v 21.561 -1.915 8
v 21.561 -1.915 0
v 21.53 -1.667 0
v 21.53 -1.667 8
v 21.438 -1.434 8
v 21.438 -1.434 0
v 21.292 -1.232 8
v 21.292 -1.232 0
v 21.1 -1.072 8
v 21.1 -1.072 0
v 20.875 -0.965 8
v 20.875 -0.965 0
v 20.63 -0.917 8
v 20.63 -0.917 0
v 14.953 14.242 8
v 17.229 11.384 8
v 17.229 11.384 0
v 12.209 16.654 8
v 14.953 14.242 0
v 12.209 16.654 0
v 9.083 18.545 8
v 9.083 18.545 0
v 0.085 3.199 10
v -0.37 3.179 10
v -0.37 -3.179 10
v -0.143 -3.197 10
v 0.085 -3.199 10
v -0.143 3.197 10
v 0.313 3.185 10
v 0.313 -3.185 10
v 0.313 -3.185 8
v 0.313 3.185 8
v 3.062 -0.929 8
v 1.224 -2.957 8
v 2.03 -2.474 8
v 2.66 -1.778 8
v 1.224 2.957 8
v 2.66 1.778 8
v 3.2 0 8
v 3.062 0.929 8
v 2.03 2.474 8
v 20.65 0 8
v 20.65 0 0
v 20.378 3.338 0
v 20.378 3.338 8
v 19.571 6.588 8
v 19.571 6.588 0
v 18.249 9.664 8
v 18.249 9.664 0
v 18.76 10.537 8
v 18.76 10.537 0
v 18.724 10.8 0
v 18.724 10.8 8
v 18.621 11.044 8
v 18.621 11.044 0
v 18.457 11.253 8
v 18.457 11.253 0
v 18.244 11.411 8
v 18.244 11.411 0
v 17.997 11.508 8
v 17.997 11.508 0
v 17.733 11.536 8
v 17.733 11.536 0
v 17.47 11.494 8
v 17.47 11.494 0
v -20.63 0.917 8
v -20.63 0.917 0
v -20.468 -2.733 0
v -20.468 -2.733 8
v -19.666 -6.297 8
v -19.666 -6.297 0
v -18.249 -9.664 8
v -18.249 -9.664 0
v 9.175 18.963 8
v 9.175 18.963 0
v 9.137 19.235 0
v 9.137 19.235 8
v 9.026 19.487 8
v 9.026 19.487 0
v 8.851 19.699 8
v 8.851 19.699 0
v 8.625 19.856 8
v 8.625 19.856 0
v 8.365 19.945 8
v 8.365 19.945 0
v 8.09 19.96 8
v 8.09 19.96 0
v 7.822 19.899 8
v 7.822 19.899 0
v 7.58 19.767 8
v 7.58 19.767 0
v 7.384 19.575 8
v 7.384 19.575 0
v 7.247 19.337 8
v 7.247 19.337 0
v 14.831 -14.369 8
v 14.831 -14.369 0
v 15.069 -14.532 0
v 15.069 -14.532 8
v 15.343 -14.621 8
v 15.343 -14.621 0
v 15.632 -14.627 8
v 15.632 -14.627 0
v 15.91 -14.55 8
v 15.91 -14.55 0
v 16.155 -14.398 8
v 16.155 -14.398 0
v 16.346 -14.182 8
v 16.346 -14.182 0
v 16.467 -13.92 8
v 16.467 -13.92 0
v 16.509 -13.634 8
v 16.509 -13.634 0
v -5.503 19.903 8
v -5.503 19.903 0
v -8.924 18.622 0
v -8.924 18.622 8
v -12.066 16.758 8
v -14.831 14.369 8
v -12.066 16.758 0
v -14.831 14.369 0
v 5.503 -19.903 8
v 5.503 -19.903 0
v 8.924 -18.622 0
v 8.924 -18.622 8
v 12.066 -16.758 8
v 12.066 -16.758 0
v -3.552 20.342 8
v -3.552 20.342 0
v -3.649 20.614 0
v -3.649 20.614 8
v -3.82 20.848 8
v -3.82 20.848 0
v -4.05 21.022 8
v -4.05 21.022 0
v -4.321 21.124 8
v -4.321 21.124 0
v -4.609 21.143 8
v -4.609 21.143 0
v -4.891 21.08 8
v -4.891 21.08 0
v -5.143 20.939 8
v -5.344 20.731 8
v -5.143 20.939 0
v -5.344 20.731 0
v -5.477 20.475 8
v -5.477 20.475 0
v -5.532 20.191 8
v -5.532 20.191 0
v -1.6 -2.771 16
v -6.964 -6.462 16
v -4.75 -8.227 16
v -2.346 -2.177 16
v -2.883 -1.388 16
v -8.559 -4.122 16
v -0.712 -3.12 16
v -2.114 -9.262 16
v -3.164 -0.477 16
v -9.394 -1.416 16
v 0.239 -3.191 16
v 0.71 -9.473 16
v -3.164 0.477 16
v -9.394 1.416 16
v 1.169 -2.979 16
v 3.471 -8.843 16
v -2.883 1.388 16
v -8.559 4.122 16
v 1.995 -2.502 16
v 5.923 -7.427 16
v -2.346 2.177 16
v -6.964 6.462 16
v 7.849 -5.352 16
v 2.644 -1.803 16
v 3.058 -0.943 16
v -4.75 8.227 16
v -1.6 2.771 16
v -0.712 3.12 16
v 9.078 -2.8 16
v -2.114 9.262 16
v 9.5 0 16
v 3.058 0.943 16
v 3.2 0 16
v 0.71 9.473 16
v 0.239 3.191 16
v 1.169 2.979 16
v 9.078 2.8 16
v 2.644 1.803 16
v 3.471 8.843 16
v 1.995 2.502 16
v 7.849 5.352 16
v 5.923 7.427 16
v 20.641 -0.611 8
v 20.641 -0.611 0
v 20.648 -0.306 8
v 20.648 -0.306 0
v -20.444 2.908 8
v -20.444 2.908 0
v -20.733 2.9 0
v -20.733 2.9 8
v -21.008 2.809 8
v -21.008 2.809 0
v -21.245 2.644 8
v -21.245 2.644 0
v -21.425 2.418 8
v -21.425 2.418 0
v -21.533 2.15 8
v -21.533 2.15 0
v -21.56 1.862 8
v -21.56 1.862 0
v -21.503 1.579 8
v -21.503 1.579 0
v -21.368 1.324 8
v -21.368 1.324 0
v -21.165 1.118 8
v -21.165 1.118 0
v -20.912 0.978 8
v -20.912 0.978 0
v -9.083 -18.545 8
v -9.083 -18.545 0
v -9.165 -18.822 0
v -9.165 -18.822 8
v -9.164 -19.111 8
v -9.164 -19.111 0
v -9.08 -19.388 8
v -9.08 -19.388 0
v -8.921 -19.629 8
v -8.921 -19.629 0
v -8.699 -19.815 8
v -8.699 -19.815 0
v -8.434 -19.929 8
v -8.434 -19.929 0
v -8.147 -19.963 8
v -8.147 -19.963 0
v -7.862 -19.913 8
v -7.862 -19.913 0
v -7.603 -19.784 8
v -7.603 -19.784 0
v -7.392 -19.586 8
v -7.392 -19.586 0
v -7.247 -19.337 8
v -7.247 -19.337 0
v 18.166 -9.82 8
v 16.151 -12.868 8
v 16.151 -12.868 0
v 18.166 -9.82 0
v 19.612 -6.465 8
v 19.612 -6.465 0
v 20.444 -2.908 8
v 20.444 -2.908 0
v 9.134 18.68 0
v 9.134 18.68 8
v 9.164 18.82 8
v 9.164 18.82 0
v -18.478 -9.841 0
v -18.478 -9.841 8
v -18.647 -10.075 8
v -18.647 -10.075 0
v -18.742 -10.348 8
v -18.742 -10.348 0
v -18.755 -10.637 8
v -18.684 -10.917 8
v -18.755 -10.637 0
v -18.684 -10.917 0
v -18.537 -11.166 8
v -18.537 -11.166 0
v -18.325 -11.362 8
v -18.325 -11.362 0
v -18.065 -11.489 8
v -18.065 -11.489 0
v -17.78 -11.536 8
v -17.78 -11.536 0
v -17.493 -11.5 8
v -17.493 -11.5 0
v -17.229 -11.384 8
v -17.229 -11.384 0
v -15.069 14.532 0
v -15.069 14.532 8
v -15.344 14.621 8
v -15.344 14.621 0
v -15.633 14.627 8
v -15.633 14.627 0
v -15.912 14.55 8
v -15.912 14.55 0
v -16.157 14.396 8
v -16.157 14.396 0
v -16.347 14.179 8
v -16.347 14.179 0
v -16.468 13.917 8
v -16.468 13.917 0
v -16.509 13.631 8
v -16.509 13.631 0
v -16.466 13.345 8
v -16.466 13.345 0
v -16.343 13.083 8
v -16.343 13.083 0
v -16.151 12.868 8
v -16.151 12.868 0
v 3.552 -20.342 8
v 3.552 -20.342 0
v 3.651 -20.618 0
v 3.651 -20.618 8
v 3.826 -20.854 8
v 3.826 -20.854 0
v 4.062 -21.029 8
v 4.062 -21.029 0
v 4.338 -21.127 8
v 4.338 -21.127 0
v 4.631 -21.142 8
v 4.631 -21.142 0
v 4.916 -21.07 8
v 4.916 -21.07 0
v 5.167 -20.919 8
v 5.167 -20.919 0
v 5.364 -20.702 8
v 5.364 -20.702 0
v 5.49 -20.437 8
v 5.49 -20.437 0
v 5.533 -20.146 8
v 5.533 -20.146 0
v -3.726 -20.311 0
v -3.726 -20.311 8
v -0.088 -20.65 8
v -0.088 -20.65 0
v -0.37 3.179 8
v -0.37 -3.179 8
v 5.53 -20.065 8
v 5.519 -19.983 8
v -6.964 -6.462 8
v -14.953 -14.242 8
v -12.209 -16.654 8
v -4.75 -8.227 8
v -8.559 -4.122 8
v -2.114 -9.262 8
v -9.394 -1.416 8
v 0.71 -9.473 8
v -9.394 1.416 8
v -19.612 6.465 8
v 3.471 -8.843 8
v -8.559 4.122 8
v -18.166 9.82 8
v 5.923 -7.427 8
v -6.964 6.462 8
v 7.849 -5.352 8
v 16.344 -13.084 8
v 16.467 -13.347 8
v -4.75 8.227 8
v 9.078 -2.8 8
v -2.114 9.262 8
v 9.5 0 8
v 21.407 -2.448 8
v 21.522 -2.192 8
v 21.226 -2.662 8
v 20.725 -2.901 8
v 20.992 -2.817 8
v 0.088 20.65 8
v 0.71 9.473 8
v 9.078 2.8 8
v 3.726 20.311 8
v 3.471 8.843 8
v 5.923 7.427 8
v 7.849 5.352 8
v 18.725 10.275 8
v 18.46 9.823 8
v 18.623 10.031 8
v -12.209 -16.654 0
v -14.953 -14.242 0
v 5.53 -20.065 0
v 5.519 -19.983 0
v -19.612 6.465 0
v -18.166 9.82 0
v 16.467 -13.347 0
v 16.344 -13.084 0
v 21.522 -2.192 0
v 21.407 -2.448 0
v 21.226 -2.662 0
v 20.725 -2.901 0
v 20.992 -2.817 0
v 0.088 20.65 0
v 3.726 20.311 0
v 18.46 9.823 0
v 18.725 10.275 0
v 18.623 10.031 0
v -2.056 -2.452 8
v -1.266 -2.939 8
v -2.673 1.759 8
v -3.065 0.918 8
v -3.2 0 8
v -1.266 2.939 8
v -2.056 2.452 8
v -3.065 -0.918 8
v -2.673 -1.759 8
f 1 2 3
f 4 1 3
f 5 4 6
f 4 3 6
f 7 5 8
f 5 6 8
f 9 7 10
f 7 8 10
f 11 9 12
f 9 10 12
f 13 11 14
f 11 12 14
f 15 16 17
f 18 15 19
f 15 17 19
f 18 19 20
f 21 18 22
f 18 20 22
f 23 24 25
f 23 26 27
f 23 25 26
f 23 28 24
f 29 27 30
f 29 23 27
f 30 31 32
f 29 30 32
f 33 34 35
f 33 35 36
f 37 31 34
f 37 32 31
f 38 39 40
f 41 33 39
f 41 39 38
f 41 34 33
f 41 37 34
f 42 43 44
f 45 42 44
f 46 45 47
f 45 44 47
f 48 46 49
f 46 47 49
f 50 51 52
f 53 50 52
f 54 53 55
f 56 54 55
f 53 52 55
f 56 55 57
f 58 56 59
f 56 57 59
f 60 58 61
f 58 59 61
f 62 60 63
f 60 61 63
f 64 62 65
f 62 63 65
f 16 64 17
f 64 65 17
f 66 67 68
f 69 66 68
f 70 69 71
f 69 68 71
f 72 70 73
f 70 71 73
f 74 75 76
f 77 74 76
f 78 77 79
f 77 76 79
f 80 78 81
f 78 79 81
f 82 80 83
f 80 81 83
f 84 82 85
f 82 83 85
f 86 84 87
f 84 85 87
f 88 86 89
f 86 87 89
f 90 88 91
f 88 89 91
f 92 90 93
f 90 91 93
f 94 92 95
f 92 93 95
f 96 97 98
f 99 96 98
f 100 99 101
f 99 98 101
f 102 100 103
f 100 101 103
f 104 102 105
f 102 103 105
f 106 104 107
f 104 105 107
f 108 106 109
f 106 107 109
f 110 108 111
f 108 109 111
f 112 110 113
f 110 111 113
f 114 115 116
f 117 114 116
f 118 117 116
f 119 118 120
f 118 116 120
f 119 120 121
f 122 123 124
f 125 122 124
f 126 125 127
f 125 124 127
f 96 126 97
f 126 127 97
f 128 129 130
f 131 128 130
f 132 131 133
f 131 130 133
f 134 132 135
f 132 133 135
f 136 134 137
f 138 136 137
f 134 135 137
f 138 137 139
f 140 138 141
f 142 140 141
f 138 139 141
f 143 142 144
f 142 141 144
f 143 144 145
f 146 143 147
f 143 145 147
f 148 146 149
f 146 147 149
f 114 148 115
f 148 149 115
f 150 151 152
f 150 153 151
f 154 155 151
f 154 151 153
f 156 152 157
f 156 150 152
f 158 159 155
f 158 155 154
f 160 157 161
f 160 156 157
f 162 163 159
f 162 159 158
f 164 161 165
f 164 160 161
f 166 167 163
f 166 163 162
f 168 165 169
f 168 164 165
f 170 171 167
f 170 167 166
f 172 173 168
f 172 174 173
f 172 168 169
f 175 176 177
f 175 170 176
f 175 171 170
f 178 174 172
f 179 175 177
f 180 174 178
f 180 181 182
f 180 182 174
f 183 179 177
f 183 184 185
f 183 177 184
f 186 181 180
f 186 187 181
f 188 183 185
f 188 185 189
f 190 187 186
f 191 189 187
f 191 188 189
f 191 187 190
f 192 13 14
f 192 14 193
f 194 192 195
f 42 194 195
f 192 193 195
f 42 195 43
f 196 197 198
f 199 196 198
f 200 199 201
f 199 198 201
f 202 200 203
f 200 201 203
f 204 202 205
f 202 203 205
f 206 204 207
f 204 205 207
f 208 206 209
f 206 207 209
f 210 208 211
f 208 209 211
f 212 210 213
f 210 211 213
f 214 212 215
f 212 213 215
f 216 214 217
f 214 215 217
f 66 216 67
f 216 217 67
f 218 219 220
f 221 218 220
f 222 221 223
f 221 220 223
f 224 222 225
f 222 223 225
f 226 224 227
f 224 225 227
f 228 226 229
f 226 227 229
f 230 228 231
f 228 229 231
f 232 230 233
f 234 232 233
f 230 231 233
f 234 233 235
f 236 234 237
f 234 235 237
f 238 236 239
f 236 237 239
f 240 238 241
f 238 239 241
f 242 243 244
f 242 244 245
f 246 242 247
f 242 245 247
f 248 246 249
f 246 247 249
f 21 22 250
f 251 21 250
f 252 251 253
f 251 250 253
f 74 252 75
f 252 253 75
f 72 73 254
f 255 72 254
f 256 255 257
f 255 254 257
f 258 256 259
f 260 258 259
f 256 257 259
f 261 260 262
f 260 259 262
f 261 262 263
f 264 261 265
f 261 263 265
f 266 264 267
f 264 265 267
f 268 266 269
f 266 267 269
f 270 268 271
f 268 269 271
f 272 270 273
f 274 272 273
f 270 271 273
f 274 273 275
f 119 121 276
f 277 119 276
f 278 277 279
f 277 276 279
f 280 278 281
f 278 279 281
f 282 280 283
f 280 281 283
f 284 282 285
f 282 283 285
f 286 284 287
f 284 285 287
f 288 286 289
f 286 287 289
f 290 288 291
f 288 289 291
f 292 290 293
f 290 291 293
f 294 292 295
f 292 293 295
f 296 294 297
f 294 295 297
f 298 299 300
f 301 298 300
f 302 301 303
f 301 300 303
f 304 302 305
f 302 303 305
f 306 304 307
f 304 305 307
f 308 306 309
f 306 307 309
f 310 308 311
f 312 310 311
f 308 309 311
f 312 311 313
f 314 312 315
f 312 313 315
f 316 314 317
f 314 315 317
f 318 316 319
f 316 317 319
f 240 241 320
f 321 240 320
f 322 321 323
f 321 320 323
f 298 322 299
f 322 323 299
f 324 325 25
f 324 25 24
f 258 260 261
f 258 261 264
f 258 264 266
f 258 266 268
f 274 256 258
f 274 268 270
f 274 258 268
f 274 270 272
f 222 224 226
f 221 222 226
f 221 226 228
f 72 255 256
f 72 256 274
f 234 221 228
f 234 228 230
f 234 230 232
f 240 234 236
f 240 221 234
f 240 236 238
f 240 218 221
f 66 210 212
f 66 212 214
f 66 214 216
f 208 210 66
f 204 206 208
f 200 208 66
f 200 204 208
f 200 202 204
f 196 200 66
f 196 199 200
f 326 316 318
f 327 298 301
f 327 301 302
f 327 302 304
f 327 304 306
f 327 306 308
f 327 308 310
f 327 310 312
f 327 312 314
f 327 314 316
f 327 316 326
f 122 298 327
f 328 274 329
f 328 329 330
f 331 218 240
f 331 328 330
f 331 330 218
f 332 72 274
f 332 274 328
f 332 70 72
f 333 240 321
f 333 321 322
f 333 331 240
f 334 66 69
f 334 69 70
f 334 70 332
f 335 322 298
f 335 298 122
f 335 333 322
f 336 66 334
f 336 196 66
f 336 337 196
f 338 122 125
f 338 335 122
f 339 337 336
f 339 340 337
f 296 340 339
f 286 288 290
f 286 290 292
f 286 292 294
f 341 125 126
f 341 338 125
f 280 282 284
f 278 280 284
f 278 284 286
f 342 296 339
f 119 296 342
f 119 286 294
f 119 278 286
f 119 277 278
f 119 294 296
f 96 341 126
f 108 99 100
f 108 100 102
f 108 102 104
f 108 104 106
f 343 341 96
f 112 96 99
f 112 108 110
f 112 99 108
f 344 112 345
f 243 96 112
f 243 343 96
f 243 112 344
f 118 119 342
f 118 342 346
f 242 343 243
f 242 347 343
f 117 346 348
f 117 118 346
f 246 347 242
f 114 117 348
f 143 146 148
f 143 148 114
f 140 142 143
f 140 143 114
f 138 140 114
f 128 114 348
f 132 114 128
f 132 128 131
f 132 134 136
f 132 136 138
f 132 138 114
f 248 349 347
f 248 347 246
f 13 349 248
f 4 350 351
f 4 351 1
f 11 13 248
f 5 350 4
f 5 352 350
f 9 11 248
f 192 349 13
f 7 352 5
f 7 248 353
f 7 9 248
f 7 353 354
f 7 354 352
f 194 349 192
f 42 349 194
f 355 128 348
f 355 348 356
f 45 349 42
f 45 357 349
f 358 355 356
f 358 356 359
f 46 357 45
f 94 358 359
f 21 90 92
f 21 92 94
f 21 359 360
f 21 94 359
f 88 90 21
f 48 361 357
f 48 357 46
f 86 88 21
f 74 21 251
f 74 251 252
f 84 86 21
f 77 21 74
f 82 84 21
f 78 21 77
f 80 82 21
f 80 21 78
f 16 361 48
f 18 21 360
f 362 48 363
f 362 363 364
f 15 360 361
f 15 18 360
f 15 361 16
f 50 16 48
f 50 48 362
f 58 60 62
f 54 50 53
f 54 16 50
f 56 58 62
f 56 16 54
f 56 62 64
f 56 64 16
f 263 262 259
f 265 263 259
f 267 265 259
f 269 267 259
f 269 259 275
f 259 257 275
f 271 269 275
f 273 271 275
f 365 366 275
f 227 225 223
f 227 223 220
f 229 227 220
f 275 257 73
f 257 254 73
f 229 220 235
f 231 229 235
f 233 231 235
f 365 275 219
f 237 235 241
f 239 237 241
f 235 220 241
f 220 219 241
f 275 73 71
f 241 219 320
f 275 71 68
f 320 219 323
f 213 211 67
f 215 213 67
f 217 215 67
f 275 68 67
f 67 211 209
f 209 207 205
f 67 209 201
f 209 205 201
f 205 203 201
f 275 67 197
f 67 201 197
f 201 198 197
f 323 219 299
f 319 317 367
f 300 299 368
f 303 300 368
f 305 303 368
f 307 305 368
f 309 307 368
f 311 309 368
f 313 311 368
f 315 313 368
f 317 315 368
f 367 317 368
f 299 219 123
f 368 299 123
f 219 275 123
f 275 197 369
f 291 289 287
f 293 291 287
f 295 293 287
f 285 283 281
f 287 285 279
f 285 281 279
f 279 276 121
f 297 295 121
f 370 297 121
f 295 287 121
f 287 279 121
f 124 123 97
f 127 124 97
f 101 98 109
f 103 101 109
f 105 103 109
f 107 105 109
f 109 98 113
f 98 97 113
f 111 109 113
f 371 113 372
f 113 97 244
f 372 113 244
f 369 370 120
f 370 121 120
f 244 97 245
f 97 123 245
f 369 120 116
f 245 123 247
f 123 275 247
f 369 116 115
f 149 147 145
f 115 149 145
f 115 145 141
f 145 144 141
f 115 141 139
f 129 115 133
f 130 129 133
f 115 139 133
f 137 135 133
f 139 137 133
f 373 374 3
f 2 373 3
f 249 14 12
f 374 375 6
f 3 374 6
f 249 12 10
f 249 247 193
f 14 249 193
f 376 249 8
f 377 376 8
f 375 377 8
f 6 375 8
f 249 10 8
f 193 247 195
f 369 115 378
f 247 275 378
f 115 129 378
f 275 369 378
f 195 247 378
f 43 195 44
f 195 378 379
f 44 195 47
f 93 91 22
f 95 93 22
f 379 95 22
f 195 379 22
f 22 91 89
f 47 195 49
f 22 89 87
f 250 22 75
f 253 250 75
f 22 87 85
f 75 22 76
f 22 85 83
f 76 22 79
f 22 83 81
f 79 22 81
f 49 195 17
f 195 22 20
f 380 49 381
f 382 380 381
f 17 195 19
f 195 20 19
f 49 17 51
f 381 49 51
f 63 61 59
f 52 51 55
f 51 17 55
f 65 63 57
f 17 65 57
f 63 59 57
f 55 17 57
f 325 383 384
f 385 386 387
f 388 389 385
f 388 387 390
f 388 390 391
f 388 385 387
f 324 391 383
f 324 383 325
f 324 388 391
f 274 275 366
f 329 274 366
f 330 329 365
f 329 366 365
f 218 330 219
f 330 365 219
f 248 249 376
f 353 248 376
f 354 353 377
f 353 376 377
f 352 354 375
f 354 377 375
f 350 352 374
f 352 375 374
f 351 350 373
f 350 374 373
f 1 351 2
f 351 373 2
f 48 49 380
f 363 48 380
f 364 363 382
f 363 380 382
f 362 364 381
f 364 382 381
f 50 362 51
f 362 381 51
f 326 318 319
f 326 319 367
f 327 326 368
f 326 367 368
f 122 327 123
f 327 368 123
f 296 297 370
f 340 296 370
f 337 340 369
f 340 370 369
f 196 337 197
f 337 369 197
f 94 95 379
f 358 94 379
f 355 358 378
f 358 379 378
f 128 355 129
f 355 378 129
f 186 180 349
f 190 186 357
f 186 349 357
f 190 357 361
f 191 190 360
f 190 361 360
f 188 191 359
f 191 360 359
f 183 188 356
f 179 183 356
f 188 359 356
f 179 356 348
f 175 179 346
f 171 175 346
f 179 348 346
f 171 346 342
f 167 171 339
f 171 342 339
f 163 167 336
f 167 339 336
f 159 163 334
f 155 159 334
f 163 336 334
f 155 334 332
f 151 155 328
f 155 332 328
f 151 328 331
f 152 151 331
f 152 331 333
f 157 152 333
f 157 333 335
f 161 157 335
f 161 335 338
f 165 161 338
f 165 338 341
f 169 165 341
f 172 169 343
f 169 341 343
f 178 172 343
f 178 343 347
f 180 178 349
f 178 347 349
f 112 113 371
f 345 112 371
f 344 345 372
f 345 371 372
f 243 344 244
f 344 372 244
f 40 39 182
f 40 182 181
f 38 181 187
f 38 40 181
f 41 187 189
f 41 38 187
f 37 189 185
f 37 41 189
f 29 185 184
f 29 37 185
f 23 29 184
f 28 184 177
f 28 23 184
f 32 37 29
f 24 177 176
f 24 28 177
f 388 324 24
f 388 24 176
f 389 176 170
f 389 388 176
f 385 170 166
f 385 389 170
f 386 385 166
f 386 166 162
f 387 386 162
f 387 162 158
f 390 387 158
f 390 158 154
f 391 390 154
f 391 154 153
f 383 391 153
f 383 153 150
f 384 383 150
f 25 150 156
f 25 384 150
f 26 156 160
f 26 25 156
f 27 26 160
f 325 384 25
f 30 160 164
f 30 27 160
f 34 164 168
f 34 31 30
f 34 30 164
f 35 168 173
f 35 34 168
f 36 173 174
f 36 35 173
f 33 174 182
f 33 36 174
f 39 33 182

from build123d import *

# Parameters (mm, degrees)
F1_DEPTH = 8
F2_R     = 9.5
F2_R_2   = 3.2
F3_DEPTH = 8
F4_W     = 0.682370679
F4_H     = 6.463566795
F5_DEPTH = 2


with BuildPart() as f1:
    # F0 (on Top) → F1 (new body)
    with BuildSketch(Plane.XY):
        with BuildLine():
            ThreePointArc((20.6296333293, -0.9169125905), (20.6449077044, -0.4585693786), (20.65, 0))
            ThreePointArc((20.65, 0), (20.0407277838, 4.9791294317), (18.2488639325, 9.6644433453))
            ThreePointArc((18.2488639325, 9.6644433453), (16.899563072, 10.0263287386), (17.228671645, 11.3839963699))
            ThreePointArc((17.228671645, 11.3839963699), (13.6343948602, 15.5088934743), (9.0830237721, 18.5451120017))
            ThreePointArc((9.0830237721, 18.5451120017), (7.7787055485, 18.0447842877), (7.2469429653, 19.3366056395))
            ThreePointArc((7.2469429653, 19.3366056395), (1.9145582783, 20.5610546081), (-3.5522227527, 20.34217819))
            ThreePointArc((-3.5522227527, 20.34217819), (-3.537714089, 20.2447444729), (-3.5328621738, 20.1463560108))
            ThreePointArc((-3.5328621738, 20.1463560108), (-4.4104069619, 19.1538819703), (-5.5028716159, 19.9032887729))
            ThreePointArc((-5.5028716159, 19.9032887729), (-10.5365744934, 17.7595917167), (-14.83064092, 14.3692237056))
            ThreePointArc((-14.83064092, 14.3692237056), (-14.5928551239, 14.0354855032), (-14.5088934877, 13.634394845))
            ThreePointArc((-14.5088934877, 13.634394845), (-15.0857403153, 12.7283366831), (-16.1507762731, 12.8675920738))
            ThreePointArc((-16.1507762731, 12.8675920738), (-18.9630939126, 8.1745684449), (-20.4442583125, 2.9077142313))
            ThreePointArc((-20.4442583125, 2.9077142313), (-19.813794176, 2.5790896437), (-19.5610546025, 1.9145583389))
            ThreePointArc((-19.5610546025, 1.9145583389), (-19.8786246519, 1.1836073402), (-20.6296333275, 0.916912631))
            ThreePointArc((-20.6296333275, 0.916912631), (-20.1463560242, -4.5328621144), (-18.2488639515, -9.6644433094))
            ThreePointArc((-18.2488639515, -9.6644433094), (-17.2542563165, -9.6736514422), (-16.7595917478, -10.536574441))
            ThreePointArc((-16.7595917478, -10.536574441), (-16.8846860156, -11.020867699), (-17.2286716673, -11.383996336))
            ThreePointArc((-17.2286716673, -11.383996336), (-13.6343948907, -15.5088934475), (-9.0830238086, -18.5451119838))
            ThreePointArc((-9.0830238086, -18.5451119838), (-7.9606237803, -17.9862481273), (-7.1745684636, -18.9630939046))
            ThreePointArc((-7.1745684636, -18.9630939046), (-7.1928288188, -19.1533234235), (-7.2469430033, -19.3366056253))
            ThreePointArc((-7.2469430033, -19.3366056253), (-1.9145583187, -20.5610546044), (3.5522227127, -20.342178197))
            ThreePointArc((3.5522227127, -20.342178197), (4.313353072, -19.1707455587), (5.5028715768, -19.9032887837))
            ThreePointArc((5.5028715768, -19.9032887837), (10.5365744585, -17.7595917375), (14.8306408918, -14.3692237348))
            ThreePointArc((14.8306408918, -14.3692237348), (14.7578574579, -12.9741336224), (16.1507762478, -12.8675921056))
            ThreePointArc((16.1507762478, -12.8675921056), (18.9630939126, -8.1745684449), (20.4442583182, -2.9077141911))
            ThreePointArc((20.4442583182, -2.9077141911), (19.5653618893, -1.8218436109), (20.6296333293, -0.9169125905))
        make_face()
        with BuildLine():
            ThreePointArc((17.228671645, 11.3839963699), (16.899563072, 10.0263287386), (18.2488639325, 9.6644433453))
            ThreePointArc((18.2488639325, 9.6644433453), (17.7595917271, 10.5365744759), (17.228671645, 11.3839963699))
        make_face()
        with BuildLine():
            ThreePointArc((17.228671645, 11.3839963699), (17.7595917271, 10.5365744759), (18.2488639325, 9.6644433453))
            ThreePointArc((18.2488639325, 9.6644433453), (18.6225147264, 10.0312390454), (18.7595917271, 10.5365744759))
            ThreePointArc((18.7595917271, 10.5365744759), (18.2438849843, 11.4114802086), (17.228671645, 11.3839963699))
        make_face()
        with BuildLine():
            ThreePointArc((21.5610546063, -1.9145582985), (21.2920056043, -1.2321283472), (20.6296333293, -0.9169125905))
            ThreePointArc((20.6296333293, -0.9169125905), (20.5610546063, -1.9145582985), (20.4442583182, -2.9077141911))
            ThreePointArc((20.4442583182, -2.9077141911), (21.2255859118, -2.6618187243), (21.5610546063, -1.9145582985))
        make_face()
        with BuildLine():
            ThreePointArc((20.4442583182, -2.9077141911), (20.5610546063, -1.9145582985), (20.6296333293, -0.9169125905))
            ThreePointArc((20.6296333293, -0.9169125905), (19.5653618893, -1.8218436109), (20.4442583182, -2.9077141911))
        make_face()
        with BuildLine():
            ThreePointArc((7.2469429653, 19.3366056395), (7.7787055485, 18.0447842877), (9.0830237721, 18.5451120017))
            ThreePointArc((9.0830237721, 18.5451120017), (8.1745684263, 18.9630939207), (7.2469429653, 19.3366056395))
        make_face()
        with BuildLine():
            ThreePointArc((7.2469429653, 19.3366056395), (8.1745684263, 18.9630939207), (9.0830237721, 18.5451120017))
            ThreePointArc((9.0830237721, 18.5451120017), (9.1514142038, 18.7491492384), (9.1745684263, 18.9630939207))
            ThreePointArc((9.1745684263, 18.9630939207), (8.3647979443, 19.9448335656), (7.2469429653, 19.3366056395))
        make_face()
        with BuildLine():
            ThreePointArc((16.5088934609, -13.6343948754), (16.4149516232, -13.2112417039), (16.1507762478, -12.8675921056))
            ThreePointArc((16.1507762478, -12.8675921056), (15.5088934609, -13.6343948754), (14.8306408918, -14.3692237348))
            ThreePointArc((14.8306408918, -14.3692237348), (15.9099841183, -14.5504332396), (16.5088934609, -13.6343948754))
        make_face()
        with BuildLine():
            ThreePointArc((14.8306408918, -14.3692237348), (15.5088934609, -13.6343948754), (16.1507762478, -12.8675921056))
            ThreePointArc((16.1507762478, -12.8675921056), (14.7578574579, -12.9741336224), (14.8306408918, -14.3692237348))
        make_face()
        with BuildLine():
            ThreePointArc((-3.5328621738, 20.1463560108), (-3.537714089, 20.2447444729), (-3.5522227527, 20.34217819))
            ThreePointArc((-3.5522227527, 20.34217819), (-4.5328621738, 20.1463560108), (-5.5028716159, 19.9032887729))
            ThreePointArc((-5.5028716159, 19.9032887729), (-4.4104069619, 19.1538819703), (-3.5328621738, 20.1463560108))
        make_face()
        with BuildLine():
            ThreePointArc((-5.5028716159, 19.9032887729), (-4.5328621738, 20.1463560108), (-3.5522227527, 20.34217819))
            ThreePointArc((-3.5522227527, 20.34217819), (-4.7523712379, 21.1219664714), (-5.5028716159, 19.9032887729))
        make_face()
        with BuildLine():
            ThreePointArc((5.5328621342, -20.1463560197), (5.5253361748, -20.0239008088), (5.5028715768, -19.9032887837))
            ThreePointArc((5.5028715768, -19.9032887837), (4.5328621342, -20.1463560197), (3.5522227127, -20.342178197))
            ThreePointArc((3.5522227127, -20.342178197), (4.6312505953, -21.1415041045), (5.5328621342, -20.1463560197))
        make_face()
        with BuildLine():
            ThreePointArc((3.5522227127, -20.342178197), (4.5328621342, -20.1463560197), (5.5028715768, -19.9032887837))
            ThreePointArc((5.5028715768, -19.9032887837), (4.313353072, -19.1707455587), (3.5522227127, -20.342178197))
        make_face()
        with BuildLine():
            ThreePointArc((-14.5088934877, 13.634394845), (-14.5928551239, 14.0354855032), (-14.83064092, 14.3692237056))
            ThreePointArc((-14.83064092, 14.3692237056), (-15.5088934877, 13.634394845), (-16.1507762731, 12.8675920738))
            ThreePointArc((-16.1507762731, 12.8675920738), (-15.0857403153, 12.7283366831), (-14.5088934877, 13.634394845))
        make_face()
        with BuildLine():
            ThreePointArc((-16.1507762731, 12.8675920738), (-15.5088934877, 13.634394845), (-14.83064092, 14.3692237056))
            ThreePointArc((-14.83064092, 14.3692237056), (-16.2599294919, 14.2946560965), (-16.1507762731, 12.8675920738))
        make_face()
        with BuildLine():
            ThreePointArc((-9.0830238086, -18.5451119838), (-8.5704313432, -19.8814035368), (-7.2469430033, -19.3366056253))
            ThreePointArc((-7.2469430033, -19.3366056253), (-8.1745684636, -18.9630939046), (-9.0830238086, -18.5451119838))
        make_face()
        with BuildLine():
            ThreePointArc((-9.0830238086, -18.5451119838), (-8.1745684636, -18.9630939046), (-7.2469430033, -19.3366056253))
            ThreePointArc((-7.2469430033, -19.3366056253), (-7.1928288188, -19.1533234235), (-7.1745684636, -18.9630939046))
            ThreePointArc((-7.1745684636, -18.9630939046), (-7.9606237803, -17.9862481273), (-9.0830238086, -18.5451119838))
        make_face()
        with BuildLine():
            ThreePointArc((-19.5610546025, 1.9145583389), (-19.813794176, 2.5790896437), (-20.4442583125, 2.9077142313))
            ThreePointArc((-20.4442583125, 2.9077142313), (-20.5610546025, 1.9145583389), (-20.6296333275, 0.916912631))
            ThreePointArc((-20.6296333275, 0.916912631), (-19.8786246519, 1.1836073402), (-19.5610546025, 1.9145583389))
        make_face()
        with BuildLine():
            ThreePointArc((-20.6296333275, 0.916912631), (-20.5610546025, 1.9145583389), (-20.4442583125, 2.9077142313))
            ThreePointArc((-20.4442583125, 2.9077142313), (-21.5567473193, 2.0072730284), (-20.6296333275, 0.916912631))
        make_face()
        with BuildLine():
            ThreePointArc((-18.2488639515, -9.6644433094), (-18.6196204039, -11.0468201767), (-17.2286716673, -11.383996336))
            ThreePointArc((-17.2286716673, -11.383996336), (-17.7595917478, -10.536574441), (-18.2488639515, -9.6644433094))
        make_face()
        with BuildLine():
            ThreePointArc((-18.2488639515, -9.6644433094), (-17.7595917478, -10.536574441), (-17.2286716673, -11.383996336))
            ThreePointArc((-17.2286716673, -11.383996336), (-16.8846860156, -11.020867699), (-16.7595917478, -10.536574441))
            ThreePointArc((-16.7595917478, -10.536574441), (-17.2542563165, -9.6736514422), (-18.2488639515, -9.6644433094))
        make_face()
    extrude(amount=F1_DEPTH)

    # F2 (on face) → F3 (join)
    with BuildSketch(Plane.XY.offset(8)):
        Circle(F2_R)
        Circle(F2_R_2, mode=Mode.SUBTRACT)
    extrude(amount=F3_DEPTH)

    # F4 (on face) → F5 (join)
    with BuildSketch(Plane.XY.offset(8)):
        with Locations((-0.0285869173, -0.0104163773)):
            Rectangle(F4_W, F4_H)
    extrude(amount=F5_DEPTH)


solid = f1.part
